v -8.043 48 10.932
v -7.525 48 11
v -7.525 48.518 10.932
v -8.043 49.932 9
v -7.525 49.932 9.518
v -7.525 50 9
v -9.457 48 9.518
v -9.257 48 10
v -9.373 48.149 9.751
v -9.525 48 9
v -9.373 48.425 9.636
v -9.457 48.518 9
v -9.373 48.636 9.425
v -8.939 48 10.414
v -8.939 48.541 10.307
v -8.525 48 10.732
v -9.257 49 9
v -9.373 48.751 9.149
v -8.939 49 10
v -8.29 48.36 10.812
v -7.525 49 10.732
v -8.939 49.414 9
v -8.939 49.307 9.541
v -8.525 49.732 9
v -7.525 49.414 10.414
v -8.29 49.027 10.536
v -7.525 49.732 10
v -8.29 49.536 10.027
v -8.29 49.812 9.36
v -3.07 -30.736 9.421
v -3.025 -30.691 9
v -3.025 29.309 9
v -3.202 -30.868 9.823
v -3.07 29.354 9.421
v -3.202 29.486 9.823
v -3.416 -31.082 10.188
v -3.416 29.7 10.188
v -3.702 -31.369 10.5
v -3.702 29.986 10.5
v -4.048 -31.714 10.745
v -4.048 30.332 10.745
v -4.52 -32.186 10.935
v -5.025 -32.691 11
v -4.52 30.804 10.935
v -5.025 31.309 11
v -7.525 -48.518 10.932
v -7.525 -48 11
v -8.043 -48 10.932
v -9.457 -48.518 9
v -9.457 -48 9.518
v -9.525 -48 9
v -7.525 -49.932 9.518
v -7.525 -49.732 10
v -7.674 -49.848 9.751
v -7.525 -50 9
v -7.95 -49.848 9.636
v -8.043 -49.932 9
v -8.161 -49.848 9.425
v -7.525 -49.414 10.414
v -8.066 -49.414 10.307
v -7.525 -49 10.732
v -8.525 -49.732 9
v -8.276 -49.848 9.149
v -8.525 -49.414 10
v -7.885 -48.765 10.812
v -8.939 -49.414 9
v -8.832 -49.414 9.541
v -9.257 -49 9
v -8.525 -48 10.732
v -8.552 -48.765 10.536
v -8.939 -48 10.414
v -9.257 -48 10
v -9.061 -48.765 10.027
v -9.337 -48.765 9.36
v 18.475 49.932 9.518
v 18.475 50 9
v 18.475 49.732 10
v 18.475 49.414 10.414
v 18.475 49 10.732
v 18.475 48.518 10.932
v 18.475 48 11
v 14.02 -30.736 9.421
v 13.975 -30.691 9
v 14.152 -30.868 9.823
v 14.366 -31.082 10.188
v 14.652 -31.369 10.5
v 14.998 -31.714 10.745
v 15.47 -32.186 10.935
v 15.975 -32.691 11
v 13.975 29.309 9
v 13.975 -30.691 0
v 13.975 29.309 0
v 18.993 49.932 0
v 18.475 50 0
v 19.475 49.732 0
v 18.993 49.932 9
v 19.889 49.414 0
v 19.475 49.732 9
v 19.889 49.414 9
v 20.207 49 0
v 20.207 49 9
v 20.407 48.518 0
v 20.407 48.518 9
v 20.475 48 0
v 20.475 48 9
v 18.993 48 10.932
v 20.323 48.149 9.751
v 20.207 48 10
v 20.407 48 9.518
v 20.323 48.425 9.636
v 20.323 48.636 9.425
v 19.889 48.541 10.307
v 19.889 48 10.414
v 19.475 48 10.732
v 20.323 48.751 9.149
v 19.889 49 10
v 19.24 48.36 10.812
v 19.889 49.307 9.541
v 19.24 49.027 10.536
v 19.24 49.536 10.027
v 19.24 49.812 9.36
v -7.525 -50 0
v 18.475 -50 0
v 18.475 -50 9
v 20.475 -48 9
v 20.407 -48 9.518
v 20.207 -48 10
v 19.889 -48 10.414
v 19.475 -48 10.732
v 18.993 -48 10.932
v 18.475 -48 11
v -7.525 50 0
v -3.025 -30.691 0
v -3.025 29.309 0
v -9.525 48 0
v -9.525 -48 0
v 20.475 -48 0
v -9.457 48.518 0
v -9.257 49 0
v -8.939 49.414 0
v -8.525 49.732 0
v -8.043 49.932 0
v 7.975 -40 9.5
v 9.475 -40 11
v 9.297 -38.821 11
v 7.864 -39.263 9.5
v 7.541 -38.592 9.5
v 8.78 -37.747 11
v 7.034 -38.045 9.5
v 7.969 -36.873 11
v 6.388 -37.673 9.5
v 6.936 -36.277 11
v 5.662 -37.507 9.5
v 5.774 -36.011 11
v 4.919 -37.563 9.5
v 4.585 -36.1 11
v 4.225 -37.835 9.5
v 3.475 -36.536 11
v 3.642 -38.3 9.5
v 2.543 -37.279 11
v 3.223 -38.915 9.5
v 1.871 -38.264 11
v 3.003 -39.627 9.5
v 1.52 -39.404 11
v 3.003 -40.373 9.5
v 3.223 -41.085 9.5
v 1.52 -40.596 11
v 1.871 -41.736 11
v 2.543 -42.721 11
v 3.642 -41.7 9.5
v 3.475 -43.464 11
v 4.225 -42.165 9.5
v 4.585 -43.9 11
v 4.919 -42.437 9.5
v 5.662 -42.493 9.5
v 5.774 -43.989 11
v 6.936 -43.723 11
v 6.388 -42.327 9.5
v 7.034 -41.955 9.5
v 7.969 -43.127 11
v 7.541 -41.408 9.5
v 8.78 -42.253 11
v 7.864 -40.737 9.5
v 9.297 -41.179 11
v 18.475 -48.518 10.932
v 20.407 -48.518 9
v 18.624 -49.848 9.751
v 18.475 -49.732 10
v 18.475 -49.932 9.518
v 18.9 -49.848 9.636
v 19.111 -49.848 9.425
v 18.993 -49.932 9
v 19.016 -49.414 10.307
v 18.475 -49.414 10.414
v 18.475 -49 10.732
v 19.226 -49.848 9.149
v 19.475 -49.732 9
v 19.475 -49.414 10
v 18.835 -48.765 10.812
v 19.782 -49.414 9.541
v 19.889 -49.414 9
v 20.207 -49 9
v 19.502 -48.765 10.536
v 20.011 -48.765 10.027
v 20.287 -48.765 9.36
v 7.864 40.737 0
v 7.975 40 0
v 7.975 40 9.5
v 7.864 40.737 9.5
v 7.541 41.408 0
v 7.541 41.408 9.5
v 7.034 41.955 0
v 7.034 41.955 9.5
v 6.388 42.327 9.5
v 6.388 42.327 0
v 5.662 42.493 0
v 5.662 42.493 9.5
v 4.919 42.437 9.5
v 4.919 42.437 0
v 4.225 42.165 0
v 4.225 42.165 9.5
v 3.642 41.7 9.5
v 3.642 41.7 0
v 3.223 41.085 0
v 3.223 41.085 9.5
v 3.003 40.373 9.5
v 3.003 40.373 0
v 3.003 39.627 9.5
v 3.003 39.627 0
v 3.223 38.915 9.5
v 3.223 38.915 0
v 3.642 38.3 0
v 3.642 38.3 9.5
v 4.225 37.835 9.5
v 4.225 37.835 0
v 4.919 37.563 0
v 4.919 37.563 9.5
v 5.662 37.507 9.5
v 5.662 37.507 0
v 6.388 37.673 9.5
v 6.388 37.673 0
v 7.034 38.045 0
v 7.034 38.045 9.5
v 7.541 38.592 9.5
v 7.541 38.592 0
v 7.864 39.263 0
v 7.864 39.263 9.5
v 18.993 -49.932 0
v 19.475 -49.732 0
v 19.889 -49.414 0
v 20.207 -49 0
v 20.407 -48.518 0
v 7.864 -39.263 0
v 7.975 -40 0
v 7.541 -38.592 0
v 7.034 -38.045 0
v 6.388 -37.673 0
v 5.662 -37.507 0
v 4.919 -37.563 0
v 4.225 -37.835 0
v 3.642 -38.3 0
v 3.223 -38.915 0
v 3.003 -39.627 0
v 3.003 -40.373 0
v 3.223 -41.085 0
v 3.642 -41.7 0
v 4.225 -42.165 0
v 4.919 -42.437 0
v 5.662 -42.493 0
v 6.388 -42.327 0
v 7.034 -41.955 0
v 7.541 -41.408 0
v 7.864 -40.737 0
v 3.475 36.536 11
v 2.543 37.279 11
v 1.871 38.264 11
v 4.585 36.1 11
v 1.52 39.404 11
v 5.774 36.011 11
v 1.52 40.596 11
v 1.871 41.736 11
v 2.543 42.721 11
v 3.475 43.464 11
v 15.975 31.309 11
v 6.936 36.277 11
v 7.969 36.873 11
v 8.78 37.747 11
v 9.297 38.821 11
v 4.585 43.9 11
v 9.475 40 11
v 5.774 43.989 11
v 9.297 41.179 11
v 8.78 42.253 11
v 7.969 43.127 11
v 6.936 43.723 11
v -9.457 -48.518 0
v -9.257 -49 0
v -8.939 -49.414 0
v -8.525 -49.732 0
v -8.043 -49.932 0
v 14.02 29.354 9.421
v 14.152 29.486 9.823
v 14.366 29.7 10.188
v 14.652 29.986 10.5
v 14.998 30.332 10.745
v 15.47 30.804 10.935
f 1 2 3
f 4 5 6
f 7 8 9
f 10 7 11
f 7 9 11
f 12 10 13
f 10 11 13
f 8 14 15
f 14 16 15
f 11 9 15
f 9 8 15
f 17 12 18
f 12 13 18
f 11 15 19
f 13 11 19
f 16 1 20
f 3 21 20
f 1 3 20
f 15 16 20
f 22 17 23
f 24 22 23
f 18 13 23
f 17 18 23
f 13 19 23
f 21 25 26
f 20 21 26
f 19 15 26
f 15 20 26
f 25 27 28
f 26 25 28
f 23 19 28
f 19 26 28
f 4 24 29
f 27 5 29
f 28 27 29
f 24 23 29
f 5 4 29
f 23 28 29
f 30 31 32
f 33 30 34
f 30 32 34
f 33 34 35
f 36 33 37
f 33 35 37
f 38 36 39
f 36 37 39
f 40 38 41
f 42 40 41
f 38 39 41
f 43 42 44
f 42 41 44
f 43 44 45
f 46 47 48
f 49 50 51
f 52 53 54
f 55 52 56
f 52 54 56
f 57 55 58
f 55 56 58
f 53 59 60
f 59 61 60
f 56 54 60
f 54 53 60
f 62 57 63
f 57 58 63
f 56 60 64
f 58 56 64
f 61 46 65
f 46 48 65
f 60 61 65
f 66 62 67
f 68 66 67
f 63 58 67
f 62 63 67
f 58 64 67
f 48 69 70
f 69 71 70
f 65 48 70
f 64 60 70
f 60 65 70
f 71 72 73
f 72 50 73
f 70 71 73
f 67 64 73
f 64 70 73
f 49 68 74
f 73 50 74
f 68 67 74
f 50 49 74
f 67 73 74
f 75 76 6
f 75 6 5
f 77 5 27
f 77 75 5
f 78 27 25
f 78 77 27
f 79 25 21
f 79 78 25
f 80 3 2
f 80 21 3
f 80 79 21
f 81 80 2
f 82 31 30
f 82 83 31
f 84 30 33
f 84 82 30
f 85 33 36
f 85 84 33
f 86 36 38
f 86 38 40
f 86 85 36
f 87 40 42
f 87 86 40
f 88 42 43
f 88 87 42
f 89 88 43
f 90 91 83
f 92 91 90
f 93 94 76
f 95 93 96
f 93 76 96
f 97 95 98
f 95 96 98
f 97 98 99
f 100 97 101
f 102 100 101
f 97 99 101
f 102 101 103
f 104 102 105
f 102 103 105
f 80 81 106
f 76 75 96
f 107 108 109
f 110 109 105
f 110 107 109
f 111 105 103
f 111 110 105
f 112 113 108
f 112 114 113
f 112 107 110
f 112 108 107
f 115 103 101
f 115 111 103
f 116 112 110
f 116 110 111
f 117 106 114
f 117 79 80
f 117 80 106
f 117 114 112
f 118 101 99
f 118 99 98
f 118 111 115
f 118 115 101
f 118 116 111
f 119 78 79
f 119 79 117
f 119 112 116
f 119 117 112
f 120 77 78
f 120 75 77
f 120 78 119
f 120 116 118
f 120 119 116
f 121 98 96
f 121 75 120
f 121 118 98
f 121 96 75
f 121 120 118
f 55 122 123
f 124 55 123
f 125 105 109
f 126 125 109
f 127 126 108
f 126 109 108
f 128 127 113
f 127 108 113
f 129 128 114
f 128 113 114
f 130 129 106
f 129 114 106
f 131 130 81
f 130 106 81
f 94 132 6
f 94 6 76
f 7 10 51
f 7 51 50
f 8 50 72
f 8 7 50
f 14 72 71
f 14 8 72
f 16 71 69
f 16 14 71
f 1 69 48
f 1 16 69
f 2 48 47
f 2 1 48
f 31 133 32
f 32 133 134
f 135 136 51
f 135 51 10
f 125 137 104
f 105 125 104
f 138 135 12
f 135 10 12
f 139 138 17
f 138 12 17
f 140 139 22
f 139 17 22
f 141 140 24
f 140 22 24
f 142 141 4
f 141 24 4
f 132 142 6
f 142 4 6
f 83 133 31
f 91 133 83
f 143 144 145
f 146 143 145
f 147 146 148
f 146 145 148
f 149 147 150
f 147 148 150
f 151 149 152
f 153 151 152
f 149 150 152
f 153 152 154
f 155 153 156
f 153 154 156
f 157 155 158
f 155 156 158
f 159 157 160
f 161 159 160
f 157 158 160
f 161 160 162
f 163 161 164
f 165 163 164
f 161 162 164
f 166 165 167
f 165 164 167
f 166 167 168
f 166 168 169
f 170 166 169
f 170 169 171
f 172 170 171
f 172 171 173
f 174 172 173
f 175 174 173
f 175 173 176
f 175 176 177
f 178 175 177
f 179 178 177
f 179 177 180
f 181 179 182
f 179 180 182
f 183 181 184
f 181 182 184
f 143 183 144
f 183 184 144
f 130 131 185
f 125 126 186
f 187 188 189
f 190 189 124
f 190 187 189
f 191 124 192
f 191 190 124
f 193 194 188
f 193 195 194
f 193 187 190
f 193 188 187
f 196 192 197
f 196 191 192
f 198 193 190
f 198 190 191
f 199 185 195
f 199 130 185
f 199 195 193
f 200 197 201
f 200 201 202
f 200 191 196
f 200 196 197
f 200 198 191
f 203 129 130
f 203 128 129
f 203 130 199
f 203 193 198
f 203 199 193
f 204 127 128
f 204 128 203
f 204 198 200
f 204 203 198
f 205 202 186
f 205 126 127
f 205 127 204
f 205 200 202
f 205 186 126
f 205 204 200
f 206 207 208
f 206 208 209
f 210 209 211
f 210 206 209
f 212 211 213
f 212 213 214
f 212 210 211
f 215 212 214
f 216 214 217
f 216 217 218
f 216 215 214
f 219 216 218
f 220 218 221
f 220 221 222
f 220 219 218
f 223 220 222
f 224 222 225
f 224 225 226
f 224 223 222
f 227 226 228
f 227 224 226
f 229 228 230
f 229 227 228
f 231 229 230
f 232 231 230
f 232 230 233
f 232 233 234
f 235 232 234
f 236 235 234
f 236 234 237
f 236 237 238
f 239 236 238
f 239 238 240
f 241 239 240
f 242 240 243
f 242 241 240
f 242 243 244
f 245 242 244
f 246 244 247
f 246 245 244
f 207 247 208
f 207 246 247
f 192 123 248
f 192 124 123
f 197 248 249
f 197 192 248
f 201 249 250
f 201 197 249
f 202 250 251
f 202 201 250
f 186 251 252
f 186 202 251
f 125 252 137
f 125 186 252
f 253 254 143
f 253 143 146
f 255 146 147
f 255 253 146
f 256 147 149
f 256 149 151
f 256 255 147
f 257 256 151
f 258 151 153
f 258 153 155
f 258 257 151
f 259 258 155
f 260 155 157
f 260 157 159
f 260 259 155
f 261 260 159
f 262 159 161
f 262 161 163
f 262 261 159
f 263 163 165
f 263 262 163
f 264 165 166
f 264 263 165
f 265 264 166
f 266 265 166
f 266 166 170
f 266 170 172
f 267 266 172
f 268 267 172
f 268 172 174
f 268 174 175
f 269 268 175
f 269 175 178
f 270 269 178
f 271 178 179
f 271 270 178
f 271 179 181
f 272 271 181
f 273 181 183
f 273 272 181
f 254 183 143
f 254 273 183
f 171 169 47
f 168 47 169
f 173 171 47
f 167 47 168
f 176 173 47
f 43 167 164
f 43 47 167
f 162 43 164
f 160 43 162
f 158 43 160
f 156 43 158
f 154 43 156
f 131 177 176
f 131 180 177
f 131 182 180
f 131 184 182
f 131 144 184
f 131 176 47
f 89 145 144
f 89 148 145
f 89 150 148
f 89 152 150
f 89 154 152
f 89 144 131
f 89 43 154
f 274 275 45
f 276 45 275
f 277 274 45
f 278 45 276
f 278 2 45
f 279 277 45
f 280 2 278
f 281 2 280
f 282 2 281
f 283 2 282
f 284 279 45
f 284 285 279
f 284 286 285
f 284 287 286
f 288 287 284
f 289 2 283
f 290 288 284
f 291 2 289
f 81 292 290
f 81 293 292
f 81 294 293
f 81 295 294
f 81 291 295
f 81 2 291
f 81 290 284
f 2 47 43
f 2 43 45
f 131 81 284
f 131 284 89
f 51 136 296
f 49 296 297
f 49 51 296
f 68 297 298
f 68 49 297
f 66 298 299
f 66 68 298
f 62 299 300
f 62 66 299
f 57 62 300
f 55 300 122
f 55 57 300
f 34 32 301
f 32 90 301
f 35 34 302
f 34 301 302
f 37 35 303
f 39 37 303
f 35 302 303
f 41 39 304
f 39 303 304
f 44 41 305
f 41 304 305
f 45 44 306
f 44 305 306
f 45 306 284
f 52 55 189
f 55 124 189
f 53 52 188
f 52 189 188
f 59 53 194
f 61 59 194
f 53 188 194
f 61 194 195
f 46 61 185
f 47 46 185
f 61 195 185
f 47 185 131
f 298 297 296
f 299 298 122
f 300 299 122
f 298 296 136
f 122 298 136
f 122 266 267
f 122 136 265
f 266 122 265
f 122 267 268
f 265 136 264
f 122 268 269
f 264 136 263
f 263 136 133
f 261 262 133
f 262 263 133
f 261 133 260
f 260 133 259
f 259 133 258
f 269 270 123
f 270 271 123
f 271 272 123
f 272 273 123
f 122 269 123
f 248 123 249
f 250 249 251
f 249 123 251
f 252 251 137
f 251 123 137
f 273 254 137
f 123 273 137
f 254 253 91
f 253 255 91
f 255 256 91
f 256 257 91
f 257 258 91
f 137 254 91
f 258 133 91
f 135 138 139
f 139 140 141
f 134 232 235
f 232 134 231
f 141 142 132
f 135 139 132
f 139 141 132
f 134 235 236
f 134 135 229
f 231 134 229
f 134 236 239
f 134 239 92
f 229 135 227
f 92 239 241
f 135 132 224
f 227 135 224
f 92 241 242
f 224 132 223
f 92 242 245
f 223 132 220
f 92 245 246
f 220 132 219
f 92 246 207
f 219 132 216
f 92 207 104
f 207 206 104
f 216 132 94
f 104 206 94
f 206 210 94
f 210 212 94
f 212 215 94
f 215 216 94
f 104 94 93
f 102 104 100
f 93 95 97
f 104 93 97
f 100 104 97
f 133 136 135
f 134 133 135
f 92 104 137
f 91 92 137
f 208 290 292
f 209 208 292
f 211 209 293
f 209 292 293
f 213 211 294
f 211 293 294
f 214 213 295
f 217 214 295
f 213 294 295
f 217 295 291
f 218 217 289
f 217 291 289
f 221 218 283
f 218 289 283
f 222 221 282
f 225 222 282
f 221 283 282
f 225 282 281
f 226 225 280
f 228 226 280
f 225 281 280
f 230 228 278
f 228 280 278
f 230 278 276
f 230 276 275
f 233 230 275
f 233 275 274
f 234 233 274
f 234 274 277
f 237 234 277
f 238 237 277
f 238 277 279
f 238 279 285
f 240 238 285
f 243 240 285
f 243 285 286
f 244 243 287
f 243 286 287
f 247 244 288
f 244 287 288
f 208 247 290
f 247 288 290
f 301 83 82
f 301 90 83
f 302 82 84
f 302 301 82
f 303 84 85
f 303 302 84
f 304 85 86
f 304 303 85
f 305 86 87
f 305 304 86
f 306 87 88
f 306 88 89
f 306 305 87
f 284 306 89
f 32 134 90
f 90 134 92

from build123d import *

# Parameters (mm, degrees)
F0_W     = 30
F0_H     = 100
F0_R     = 2.5
F0_W_2   = 17
F0_H_2   = 60
F1_DEPTH = 11
F2_R     = 2
F3_SIZE  = 1.5


with BuildPart() as f1:
    # F0 (on Top) → F1 (new body)
    with BuildSketch(Plane.XY):
        with Locations((5.474986, 0)):
            Rectangle(F0_W, F0_H)
        with Locations((5.474986, -40)):
            Circle(F0_R, mode=Mode.SUBTRACT)
        with Locations((5.474986, -0.691212)):
            Rectangle(F0_W_2, F0_H_2, mode=Mode.SUBTRACT)
        with Locations((5.474986, 40)):
            Circle(F0_R, mode=Mode.SUBTRACT)
    extrude(amount=F1_DEPTH)

    # F2
    f2_edges = [f1.edges().sort_by_distance(p)[0] for p in [
        (5.474986, 50, 11),
        (-9.525014, 0, 11),
        (20.474986, 0, 11),
        (5.474986, -50, 11),
        (-9.525014, -50, 5.5),
        (20.474986, -50, 5.5),
        (-9.525014, 50, 5.5),
        (20.474986, 50, 5.5),
        (13.974986, -0.691212, 11),
        (5.474986, -30.691212, 11),
        (-3.025014, -0.691212, 11),
        (5.474986, 29.308788, 11),
    ]]
    fillet(f2_edges, radius=F2_R)

    # F3
    f3_edges = [f1.edges().sort_by_distance(p)[0] for p in [
        (2.974986, 40, 11),
        (2.974986, -40, 11),
    ]]
    chamfer(f3_edges, length=F3_SIZE)


solid = f1.part
